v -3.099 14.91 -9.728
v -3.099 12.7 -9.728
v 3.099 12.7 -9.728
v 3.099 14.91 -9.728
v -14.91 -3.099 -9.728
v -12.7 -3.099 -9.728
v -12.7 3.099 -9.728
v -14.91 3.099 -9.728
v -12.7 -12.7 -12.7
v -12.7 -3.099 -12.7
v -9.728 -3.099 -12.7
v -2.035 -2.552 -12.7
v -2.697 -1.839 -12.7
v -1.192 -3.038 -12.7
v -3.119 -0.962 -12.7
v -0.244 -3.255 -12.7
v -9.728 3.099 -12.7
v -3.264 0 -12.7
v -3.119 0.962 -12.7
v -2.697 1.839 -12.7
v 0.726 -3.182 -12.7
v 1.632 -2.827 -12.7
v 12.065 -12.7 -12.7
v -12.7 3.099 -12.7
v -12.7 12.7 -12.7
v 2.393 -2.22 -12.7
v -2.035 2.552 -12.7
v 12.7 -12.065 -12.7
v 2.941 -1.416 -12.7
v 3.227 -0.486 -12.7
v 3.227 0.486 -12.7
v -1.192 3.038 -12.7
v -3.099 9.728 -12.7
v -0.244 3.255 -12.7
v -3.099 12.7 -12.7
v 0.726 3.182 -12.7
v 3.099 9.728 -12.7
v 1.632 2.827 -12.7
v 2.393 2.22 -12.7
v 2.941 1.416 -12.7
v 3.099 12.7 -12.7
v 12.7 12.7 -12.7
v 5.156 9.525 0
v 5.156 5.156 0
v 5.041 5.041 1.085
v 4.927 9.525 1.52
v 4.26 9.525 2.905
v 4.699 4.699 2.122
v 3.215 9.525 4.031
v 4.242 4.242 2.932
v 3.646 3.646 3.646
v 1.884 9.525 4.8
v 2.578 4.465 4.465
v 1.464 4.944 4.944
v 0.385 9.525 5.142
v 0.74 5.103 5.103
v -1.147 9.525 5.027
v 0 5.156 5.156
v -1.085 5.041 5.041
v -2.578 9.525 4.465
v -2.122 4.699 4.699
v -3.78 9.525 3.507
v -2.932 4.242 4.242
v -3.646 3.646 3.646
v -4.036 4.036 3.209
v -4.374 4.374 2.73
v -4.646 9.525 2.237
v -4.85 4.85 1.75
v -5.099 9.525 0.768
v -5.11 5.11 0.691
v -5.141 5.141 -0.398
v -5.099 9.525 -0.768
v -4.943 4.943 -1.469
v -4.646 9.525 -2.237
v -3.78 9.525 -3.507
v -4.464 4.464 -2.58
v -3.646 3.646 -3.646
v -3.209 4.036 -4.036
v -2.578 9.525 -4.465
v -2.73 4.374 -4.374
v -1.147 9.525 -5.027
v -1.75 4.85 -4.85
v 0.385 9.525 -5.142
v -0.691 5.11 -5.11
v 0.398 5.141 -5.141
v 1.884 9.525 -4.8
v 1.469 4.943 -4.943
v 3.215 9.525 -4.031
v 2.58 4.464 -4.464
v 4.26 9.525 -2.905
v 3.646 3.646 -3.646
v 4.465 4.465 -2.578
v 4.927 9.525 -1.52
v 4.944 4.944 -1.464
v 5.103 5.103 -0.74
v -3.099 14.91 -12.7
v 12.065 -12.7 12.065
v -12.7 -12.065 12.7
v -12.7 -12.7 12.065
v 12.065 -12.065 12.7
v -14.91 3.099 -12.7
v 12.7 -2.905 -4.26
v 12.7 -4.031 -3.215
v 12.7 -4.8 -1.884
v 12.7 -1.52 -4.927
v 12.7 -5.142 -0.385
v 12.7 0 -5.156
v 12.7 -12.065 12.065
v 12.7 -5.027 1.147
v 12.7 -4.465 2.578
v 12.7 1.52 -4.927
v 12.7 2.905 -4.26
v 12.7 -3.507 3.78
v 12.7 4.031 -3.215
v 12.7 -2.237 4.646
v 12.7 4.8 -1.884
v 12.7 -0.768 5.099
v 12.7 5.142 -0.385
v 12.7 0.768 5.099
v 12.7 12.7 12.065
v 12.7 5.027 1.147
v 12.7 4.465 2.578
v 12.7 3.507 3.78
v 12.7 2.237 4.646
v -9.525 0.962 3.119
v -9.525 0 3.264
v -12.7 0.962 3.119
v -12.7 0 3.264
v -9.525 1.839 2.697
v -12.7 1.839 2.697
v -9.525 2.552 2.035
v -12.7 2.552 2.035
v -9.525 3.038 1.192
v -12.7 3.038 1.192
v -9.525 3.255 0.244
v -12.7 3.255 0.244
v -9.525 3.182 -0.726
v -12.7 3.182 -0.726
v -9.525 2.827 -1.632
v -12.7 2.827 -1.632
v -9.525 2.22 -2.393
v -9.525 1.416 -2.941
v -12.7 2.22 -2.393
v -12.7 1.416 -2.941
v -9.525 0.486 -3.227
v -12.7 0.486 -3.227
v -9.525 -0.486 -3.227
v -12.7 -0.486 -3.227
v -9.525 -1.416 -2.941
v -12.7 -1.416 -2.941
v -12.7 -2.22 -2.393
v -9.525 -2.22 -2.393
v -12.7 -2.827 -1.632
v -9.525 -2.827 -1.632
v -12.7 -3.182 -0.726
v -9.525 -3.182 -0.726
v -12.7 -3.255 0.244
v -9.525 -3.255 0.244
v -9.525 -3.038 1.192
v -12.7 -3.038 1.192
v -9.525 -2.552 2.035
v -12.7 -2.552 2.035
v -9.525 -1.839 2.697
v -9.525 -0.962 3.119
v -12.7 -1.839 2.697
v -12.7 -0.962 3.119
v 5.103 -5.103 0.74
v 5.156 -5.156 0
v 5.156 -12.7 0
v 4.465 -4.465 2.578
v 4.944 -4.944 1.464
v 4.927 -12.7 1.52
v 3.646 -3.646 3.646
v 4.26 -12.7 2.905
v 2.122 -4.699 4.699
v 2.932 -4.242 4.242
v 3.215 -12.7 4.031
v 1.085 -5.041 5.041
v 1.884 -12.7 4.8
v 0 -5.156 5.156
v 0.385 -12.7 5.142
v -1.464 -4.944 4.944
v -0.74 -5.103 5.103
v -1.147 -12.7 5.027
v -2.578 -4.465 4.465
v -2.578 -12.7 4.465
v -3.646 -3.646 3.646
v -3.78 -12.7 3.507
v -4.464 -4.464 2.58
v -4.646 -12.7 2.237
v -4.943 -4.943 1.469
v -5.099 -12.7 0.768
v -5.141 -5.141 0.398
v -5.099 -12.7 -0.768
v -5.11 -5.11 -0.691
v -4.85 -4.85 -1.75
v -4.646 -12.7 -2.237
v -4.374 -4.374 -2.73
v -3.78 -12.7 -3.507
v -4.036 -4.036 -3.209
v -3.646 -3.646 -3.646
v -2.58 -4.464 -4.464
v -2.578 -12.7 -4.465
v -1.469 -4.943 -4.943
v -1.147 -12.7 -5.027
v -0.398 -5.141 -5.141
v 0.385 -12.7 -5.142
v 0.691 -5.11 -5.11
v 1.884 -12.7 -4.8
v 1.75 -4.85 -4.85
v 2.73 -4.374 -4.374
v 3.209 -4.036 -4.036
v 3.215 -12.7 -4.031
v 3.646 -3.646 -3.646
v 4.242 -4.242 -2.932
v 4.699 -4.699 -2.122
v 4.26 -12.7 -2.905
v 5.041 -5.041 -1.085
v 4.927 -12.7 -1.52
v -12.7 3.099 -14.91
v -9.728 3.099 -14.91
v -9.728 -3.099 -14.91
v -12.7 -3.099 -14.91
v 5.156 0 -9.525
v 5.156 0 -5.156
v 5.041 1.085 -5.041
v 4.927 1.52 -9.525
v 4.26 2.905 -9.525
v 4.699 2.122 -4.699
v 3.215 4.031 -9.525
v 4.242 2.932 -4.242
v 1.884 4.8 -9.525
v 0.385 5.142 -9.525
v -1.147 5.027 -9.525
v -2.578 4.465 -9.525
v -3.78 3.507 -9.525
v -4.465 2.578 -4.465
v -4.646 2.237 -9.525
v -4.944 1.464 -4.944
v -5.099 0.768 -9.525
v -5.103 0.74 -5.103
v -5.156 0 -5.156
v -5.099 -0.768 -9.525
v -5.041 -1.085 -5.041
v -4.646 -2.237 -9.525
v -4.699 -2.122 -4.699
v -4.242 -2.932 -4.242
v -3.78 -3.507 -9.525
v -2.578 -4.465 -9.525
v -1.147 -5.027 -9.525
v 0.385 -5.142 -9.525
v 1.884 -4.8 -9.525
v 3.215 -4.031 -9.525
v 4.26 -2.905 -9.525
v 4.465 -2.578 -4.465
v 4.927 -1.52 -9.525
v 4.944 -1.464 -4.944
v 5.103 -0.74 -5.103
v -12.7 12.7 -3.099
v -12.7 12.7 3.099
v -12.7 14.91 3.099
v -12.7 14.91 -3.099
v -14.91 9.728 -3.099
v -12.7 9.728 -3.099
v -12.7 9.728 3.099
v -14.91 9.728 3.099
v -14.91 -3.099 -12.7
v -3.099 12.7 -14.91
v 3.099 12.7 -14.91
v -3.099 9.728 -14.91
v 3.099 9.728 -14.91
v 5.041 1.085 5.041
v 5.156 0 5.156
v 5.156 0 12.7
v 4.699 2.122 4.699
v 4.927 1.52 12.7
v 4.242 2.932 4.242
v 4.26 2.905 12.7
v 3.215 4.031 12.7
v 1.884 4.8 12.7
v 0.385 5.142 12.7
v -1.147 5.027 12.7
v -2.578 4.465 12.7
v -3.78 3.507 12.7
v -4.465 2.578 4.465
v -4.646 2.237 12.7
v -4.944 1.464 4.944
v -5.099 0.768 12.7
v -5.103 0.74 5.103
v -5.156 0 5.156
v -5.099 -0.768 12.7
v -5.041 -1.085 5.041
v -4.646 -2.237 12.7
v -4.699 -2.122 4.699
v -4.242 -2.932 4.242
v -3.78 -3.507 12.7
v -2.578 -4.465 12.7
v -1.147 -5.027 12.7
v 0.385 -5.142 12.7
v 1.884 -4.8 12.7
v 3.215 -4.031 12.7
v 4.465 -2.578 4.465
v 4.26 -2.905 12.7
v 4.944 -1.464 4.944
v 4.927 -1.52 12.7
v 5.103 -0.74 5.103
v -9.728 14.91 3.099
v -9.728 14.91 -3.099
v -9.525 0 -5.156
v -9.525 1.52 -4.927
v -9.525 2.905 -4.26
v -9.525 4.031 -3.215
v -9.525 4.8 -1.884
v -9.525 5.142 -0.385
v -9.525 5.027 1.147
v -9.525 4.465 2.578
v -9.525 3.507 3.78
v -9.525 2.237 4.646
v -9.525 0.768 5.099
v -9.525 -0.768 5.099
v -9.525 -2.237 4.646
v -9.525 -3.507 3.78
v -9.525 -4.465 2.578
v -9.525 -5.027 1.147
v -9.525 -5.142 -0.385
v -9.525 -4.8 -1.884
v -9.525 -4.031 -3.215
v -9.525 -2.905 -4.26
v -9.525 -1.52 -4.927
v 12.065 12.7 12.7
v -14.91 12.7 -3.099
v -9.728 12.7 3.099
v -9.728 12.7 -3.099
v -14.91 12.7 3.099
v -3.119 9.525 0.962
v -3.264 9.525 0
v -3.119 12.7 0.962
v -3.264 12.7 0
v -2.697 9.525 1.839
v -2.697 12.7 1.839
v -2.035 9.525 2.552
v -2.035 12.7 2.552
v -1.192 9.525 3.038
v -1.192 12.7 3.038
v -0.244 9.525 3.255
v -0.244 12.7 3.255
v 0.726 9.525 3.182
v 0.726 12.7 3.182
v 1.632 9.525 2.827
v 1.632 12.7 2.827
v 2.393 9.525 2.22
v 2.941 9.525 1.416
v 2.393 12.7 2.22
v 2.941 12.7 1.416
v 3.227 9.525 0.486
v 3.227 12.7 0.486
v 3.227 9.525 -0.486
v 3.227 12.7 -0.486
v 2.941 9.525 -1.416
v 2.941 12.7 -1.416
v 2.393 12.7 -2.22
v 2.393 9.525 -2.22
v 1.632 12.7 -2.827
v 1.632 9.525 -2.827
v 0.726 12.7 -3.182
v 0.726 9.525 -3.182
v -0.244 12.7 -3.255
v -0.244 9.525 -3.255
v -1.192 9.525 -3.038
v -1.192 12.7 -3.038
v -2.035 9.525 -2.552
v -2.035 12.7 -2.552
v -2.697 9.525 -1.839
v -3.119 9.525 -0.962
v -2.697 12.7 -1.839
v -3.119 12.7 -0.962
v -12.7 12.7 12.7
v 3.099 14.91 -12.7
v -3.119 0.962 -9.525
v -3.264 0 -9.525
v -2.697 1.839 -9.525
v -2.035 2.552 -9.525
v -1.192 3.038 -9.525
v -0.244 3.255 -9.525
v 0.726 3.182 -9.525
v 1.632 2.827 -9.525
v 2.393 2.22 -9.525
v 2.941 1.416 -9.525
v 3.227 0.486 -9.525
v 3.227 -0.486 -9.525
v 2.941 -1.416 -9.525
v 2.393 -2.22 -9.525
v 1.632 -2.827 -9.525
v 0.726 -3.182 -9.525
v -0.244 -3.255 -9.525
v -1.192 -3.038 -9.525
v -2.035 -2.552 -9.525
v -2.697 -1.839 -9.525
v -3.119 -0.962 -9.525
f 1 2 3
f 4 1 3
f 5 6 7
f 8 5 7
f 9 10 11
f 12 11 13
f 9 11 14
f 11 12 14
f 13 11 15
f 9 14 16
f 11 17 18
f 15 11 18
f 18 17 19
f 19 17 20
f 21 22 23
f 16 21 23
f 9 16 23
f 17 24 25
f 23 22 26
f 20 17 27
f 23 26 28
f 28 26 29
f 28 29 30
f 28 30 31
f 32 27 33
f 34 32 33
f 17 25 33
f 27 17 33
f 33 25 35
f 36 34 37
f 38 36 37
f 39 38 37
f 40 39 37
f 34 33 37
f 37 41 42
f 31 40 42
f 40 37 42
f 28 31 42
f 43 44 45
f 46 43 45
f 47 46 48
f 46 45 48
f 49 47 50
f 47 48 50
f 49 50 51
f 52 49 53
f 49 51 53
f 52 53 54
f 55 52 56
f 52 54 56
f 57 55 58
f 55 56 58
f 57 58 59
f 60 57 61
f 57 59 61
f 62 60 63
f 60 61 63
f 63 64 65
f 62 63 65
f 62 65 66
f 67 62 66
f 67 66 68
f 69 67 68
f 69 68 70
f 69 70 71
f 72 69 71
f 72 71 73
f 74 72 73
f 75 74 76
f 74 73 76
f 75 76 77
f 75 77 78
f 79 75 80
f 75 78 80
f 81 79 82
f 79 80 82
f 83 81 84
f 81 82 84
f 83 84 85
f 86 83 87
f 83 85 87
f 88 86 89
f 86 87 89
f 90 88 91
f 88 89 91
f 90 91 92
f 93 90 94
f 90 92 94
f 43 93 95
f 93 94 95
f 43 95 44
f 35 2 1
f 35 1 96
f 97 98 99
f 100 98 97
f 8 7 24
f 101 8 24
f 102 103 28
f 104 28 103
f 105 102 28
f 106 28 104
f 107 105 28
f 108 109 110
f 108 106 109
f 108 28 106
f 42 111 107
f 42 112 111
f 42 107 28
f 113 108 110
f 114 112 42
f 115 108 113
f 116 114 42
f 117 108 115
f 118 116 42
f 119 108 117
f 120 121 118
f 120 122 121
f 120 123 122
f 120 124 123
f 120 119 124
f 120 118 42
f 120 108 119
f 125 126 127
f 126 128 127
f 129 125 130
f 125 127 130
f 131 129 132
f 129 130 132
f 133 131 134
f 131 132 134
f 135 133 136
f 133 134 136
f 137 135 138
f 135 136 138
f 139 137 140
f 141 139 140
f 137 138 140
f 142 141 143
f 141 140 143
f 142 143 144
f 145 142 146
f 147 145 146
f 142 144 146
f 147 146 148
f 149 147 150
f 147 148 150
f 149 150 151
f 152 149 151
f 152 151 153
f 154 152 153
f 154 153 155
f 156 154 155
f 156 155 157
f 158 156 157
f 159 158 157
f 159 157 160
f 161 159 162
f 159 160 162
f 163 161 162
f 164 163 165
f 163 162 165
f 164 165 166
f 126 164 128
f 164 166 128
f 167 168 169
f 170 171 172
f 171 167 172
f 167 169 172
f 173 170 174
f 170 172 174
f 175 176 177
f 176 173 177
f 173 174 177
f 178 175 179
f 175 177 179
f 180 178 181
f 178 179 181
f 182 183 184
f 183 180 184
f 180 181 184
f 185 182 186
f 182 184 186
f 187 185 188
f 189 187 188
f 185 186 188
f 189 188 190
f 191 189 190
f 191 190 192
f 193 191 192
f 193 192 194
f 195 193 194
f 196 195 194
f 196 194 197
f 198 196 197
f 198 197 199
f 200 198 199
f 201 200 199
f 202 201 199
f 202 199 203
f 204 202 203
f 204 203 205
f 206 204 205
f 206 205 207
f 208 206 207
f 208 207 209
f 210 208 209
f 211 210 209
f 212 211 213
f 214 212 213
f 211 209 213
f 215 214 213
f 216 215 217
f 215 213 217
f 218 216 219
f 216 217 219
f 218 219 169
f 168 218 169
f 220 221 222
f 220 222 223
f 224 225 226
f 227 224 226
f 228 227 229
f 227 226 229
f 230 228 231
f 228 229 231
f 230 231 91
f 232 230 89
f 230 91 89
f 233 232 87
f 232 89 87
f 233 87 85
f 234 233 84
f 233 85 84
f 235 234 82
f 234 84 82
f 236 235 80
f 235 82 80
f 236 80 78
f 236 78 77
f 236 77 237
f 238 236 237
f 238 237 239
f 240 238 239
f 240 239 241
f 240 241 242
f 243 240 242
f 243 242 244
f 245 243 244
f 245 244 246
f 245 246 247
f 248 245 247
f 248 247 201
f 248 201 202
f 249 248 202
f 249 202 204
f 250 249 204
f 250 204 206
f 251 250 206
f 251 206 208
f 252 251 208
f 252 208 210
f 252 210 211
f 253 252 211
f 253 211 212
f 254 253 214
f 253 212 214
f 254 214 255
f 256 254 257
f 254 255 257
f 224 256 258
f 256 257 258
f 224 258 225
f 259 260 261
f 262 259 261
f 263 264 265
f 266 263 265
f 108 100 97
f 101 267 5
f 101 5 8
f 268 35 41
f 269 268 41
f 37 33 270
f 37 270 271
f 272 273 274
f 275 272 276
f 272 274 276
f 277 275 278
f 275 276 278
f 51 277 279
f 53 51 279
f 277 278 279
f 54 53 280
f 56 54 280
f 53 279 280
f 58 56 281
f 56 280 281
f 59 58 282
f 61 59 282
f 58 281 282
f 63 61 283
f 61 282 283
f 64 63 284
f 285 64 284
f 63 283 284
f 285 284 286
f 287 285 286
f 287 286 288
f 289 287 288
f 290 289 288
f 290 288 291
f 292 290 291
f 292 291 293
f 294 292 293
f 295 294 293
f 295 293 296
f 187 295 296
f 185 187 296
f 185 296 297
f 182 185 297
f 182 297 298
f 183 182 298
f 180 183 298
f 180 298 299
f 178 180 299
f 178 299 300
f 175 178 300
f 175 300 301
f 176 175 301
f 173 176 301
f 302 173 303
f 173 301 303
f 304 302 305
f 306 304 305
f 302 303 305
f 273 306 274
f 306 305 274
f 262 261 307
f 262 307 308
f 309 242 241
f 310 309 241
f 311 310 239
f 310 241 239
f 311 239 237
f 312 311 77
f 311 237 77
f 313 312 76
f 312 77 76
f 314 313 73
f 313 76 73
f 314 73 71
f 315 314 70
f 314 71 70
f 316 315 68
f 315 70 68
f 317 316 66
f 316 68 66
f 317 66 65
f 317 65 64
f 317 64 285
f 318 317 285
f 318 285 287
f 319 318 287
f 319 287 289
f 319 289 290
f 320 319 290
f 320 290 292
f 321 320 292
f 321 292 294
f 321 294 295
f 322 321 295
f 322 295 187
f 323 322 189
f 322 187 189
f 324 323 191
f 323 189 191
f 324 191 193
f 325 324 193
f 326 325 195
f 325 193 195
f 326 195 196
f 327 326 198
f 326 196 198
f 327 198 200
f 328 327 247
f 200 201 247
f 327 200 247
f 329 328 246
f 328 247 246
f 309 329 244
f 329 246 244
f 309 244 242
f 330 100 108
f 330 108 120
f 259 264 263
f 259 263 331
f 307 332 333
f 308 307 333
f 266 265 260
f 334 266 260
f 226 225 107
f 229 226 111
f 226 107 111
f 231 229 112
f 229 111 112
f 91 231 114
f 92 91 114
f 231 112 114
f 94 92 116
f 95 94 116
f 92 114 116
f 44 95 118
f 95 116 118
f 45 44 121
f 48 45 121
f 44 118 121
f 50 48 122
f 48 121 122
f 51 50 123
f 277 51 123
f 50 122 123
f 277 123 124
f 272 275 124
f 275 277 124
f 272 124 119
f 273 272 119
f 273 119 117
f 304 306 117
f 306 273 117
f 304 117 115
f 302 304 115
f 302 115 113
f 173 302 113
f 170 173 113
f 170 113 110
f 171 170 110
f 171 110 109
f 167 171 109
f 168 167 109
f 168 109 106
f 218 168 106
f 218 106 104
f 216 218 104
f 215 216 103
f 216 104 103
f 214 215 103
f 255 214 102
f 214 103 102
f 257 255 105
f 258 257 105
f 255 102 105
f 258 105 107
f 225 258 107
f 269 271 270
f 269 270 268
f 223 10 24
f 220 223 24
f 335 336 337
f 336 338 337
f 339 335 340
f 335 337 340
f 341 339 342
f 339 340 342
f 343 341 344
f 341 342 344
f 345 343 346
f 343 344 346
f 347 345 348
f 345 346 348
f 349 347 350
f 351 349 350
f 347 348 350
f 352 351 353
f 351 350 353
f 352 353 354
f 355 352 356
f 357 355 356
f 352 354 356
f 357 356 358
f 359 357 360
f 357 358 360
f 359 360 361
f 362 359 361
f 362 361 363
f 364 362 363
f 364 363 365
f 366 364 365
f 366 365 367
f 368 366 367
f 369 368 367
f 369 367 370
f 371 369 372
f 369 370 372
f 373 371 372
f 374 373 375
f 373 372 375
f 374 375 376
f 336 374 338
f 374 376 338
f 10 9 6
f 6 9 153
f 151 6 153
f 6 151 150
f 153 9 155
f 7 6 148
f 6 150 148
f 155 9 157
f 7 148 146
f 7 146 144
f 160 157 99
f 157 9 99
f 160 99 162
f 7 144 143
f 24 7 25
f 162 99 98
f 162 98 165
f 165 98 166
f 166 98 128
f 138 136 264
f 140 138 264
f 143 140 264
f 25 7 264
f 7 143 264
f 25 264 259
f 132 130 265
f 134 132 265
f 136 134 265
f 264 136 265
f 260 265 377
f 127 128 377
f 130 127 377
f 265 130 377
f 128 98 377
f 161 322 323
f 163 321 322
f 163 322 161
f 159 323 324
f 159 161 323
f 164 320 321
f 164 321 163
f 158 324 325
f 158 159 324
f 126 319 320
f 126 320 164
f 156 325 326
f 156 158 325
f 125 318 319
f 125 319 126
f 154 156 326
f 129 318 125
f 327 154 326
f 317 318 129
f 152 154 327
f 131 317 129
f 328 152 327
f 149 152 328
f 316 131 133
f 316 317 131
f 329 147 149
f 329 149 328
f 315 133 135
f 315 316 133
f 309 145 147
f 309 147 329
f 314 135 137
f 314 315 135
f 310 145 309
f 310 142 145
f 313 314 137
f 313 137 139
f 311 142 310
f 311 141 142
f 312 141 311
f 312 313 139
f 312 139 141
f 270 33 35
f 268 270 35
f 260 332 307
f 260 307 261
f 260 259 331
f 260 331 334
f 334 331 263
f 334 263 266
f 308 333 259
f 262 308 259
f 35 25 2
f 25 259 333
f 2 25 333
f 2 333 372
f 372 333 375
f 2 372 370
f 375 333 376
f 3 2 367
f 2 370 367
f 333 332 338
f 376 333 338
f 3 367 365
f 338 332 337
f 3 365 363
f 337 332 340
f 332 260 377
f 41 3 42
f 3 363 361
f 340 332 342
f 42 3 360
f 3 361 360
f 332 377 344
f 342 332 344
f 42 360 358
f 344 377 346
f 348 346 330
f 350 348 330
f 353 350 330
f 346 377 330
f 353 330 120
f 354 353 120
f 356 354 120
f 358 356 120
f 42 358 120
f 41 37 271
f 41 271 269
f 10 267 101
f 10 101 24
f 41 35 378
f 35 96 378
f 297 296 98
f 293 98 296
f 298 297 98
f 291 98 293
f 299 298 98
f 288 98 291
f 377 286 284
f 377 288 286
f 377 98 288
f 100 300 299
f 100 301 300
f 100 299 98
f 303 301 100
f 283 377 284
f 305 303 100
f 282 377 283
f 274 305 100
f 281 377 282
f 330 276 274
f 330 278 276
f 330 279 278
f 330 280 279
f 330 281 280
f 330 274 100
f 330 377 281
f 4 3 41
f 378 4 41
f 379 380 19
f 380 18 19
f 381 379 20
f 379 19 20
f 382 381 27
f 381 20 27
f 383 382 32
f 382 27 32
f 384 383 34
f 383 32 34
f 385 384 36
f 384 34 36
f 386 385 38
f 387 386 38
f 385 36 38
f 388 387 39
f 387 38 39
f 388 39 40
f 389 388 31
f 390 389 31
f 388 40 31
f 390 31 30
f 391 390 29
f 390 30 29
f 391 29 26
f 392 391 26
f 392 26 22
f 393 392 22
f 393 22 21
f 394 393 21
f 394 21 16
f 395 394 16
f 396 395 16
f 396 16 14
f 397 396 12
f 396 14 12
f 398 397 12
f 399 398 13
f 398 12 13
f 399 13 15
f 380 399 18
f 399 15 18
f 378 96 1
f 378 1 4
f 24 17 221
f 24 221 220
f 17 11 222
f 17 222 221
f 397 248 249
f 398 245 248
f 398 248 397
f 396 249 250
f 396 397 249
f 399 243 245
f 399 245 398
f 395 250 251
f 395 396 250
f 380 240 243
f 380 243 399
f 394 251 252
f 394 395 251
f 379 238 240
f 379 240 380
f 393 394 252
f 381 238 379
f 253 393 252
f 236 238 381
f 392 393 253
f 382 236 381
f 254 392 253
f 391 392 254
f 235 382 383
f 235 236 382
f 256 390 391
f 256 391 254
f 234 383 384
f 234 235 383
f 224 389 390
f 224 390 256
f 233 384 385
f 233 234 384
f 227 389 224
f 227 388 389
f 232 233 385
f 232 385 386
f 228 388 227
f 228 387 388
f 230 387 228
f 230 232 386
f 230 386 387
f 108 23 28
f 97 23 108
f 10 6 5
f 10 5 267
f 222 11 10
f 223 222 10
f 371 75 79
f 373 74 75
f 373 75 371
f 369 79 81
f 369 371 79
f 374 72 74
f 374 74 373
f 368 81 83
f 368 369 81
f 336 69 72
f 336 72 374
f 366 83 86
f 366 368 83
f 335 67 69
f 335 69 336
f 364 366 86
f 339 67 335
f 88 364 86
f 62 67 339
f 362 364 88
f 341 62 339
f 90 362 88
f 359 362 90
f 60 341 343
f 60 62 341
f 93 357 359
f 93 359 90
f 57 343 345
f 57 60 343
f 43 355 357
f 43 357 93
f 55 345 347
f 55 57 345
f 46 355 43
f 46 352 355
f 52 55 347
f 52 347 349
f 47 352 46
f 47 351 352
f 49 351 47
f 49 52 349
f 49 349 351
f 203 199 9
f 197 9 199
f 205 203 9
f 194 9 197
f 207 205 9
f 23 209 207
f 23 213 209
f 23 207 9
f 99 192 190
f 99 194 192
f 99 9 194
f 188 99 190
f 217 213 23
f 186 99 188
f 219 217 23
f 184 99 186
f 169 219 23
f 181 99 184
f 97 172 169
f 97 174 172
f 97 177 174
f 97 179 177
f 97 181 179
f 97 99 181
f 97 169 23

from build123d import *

# Parameters (mm, degrees)
SKETCH1_W           = 25.4
SKETCH1_H           = 25.4
BOSS_EXTRUDE1_DEPTH = 12.7
HOLE1_D             = 6.5278
HOLE1_DEPTH         = 100
HOLE1_CBORE_D       = 10.3124
HOLE1_CBORE_DEPTH   = 22.225
HOLE2_D             = 6.5278
HOLE2_DEPTH         = 100
HOLE2_CBORE_D       = 10.3124
HOLE2_CBORE_DEPTH   = 22.225
HOLE3_D             = 6.5278
HOLE3_DEPTH         = 100
HOLE3_CBORE_D       = 10.3124
HOLE3_CBORE_DEPTH   = 22.225
SKETCH8_W           = 6.1976
SKETCH8_H           = 2.9718
BOSS_EXTRUDE2_DEPTH = 2.2098
CIRPATTERN1_COUNT   = 2
CIRPATTERN1_ANGLE   = 270
SKETCH9_W           = 6.1976
SKETCH9_H           = 2.9718
BOSS_EXTRUDE3_DEPTH = 2.2098
CIRPATTERN2_COUNT   = 2
CIRPATTERN2_ANGLE   = 270
SKETCH10_W          = 2.9718
SKETCH10_H          = 6.1976
BOSS_EXTRUDE4_DEPTH = 2.2098
CIRPATTERN3_COUNT   = 2
CIRPATTERN3_ANGLE   = 90
CHAMFER1_SIZE       = 0.635


with BuildPart() as part:
    # Sketch1 → Boss-Extrude1 (new, symmetric)
    with BuildSketch(Plane.XY):
        Rectangle(SKETCH1_W, SKETCH1_H)
    extrude(amount=BOSS_EXTRUDE1_DEPTH, both=True)

    # Hole1
    with Locations(Plane.XY.offset(12.7)):
        with Locations((0, 0)):
            CounterBoreHole(HOLE1_D / 2, HOLE1_CBORE_D / 2, HOLE1_CBORE_DEPTH, depth=HOLE1_DEPTH)

    # Hole2
    with Locations(Plane(origin=(12.7, 0, 0), x_dir=(0, 0, -1), z_dir=(1, 0, 0))):
        with Locations((0, 0)):
            CounterBoreHole(HOLE2_D / 2, HOLE2_CBORE_D / 2, HOLE2_CBORE_DEPTH, depth=HOLE2_DEPTH)

    # Hole3
    with Locations(Plane.XZ.offset(12.7)):
        with Locations((0, 0)):
            CounterBoreHole(HOLE3_D / 2, HOLE3_CBORE_D / 2, HOLE3_CBORE_DEPTH, depth=HOLE3_DEPTH)

    # Sketch8 → Boss-Extrude2 (add)
    with BuildSketch(Plane(origin=(0, 12.7, 0), x_dir=(1, 0, 0), z_dir=(0, 1, 0))):
        with Locations((0, 11.2141)):
            Rectangle(SKETCH8_W, SKETCH8_H)
    boss_extrude2 = extrude(amount=BOSS_EXTRUDE2_DEPTH)

    # CirPattern1: Boss-Extrude2 ×2 about axis
    cirpattern1_axis = Axis((0, 0, 0), (0, -1, 0))
    for i in range(1, CIRPATTERN1_COUNT):
        add(boss_extrude2.rotate(cirpattern1_axis, i * CIRPATTERN1_ANGLE / (CIRPATTERN1_COUNT - 1)))

    # Sketch9 → Boss-Extrude3 (add)
    with BuildSketch(Plane.ZY.offset(12.7)):
        with Locations((0, 11.2141)):
            Rectangle(SKETCH9_W, SKETCH9_H)
    boss_extrude3 = extrude(amount=BOSS_EXTRUDE3_DEPTH)

    # CirPattern2: Boss-Extrude3 ×2 about axis
    cirpattern2_axis = Axis((0, 0, 0), (1, 0, 0))
    for i in range(1, CIRPATTERN2_COUNT):
        add(boss_extrude3.rotate(cirpattern2_axis, i * CIRPATTERN2_ANGLE / (CIRPATTERN2_COUNT - 1)))

    # Sketch10 → Boss-Extrude4 (add)
    with BuildSketch(Plane(origin=(0, 0, -12.7), x_dir=(-1, 0, 0), z_dir=(0, 0, -1))):
        with Locations((11.2141, 0)):
            Rectangle(SKETCH10_W, SKETCH10_H)
    boss_extrude4 = extrude(amount=BOSS_EXTRUDE4_DEPTH)

    # CirPattern3: Boss-Extrude4 ×2 about axis
    cirpattern3_axis = Axis((0, 0, 0), (0, 0, -1))
    for i in range(1, CIRPATTERN3_COUNT):
        add(boss_extrude4.rotate(cirpattern3_axis, i * CIRPATTERN3_ANGLE / (CIRPATTERN3_COUNT - 1)))

    # Chamfer1
    chamfer1_edges = [part.edges().sort_by_distance(p)[0] for p in [
        (0, -12.7, 12.7),
        (12.7, 0, 12.7),
        (12.7, -12.7, 0),
    ]]
    chamfer(chamfer1_edges, length=CHAMFER1_SIZE)


solid = part.part
